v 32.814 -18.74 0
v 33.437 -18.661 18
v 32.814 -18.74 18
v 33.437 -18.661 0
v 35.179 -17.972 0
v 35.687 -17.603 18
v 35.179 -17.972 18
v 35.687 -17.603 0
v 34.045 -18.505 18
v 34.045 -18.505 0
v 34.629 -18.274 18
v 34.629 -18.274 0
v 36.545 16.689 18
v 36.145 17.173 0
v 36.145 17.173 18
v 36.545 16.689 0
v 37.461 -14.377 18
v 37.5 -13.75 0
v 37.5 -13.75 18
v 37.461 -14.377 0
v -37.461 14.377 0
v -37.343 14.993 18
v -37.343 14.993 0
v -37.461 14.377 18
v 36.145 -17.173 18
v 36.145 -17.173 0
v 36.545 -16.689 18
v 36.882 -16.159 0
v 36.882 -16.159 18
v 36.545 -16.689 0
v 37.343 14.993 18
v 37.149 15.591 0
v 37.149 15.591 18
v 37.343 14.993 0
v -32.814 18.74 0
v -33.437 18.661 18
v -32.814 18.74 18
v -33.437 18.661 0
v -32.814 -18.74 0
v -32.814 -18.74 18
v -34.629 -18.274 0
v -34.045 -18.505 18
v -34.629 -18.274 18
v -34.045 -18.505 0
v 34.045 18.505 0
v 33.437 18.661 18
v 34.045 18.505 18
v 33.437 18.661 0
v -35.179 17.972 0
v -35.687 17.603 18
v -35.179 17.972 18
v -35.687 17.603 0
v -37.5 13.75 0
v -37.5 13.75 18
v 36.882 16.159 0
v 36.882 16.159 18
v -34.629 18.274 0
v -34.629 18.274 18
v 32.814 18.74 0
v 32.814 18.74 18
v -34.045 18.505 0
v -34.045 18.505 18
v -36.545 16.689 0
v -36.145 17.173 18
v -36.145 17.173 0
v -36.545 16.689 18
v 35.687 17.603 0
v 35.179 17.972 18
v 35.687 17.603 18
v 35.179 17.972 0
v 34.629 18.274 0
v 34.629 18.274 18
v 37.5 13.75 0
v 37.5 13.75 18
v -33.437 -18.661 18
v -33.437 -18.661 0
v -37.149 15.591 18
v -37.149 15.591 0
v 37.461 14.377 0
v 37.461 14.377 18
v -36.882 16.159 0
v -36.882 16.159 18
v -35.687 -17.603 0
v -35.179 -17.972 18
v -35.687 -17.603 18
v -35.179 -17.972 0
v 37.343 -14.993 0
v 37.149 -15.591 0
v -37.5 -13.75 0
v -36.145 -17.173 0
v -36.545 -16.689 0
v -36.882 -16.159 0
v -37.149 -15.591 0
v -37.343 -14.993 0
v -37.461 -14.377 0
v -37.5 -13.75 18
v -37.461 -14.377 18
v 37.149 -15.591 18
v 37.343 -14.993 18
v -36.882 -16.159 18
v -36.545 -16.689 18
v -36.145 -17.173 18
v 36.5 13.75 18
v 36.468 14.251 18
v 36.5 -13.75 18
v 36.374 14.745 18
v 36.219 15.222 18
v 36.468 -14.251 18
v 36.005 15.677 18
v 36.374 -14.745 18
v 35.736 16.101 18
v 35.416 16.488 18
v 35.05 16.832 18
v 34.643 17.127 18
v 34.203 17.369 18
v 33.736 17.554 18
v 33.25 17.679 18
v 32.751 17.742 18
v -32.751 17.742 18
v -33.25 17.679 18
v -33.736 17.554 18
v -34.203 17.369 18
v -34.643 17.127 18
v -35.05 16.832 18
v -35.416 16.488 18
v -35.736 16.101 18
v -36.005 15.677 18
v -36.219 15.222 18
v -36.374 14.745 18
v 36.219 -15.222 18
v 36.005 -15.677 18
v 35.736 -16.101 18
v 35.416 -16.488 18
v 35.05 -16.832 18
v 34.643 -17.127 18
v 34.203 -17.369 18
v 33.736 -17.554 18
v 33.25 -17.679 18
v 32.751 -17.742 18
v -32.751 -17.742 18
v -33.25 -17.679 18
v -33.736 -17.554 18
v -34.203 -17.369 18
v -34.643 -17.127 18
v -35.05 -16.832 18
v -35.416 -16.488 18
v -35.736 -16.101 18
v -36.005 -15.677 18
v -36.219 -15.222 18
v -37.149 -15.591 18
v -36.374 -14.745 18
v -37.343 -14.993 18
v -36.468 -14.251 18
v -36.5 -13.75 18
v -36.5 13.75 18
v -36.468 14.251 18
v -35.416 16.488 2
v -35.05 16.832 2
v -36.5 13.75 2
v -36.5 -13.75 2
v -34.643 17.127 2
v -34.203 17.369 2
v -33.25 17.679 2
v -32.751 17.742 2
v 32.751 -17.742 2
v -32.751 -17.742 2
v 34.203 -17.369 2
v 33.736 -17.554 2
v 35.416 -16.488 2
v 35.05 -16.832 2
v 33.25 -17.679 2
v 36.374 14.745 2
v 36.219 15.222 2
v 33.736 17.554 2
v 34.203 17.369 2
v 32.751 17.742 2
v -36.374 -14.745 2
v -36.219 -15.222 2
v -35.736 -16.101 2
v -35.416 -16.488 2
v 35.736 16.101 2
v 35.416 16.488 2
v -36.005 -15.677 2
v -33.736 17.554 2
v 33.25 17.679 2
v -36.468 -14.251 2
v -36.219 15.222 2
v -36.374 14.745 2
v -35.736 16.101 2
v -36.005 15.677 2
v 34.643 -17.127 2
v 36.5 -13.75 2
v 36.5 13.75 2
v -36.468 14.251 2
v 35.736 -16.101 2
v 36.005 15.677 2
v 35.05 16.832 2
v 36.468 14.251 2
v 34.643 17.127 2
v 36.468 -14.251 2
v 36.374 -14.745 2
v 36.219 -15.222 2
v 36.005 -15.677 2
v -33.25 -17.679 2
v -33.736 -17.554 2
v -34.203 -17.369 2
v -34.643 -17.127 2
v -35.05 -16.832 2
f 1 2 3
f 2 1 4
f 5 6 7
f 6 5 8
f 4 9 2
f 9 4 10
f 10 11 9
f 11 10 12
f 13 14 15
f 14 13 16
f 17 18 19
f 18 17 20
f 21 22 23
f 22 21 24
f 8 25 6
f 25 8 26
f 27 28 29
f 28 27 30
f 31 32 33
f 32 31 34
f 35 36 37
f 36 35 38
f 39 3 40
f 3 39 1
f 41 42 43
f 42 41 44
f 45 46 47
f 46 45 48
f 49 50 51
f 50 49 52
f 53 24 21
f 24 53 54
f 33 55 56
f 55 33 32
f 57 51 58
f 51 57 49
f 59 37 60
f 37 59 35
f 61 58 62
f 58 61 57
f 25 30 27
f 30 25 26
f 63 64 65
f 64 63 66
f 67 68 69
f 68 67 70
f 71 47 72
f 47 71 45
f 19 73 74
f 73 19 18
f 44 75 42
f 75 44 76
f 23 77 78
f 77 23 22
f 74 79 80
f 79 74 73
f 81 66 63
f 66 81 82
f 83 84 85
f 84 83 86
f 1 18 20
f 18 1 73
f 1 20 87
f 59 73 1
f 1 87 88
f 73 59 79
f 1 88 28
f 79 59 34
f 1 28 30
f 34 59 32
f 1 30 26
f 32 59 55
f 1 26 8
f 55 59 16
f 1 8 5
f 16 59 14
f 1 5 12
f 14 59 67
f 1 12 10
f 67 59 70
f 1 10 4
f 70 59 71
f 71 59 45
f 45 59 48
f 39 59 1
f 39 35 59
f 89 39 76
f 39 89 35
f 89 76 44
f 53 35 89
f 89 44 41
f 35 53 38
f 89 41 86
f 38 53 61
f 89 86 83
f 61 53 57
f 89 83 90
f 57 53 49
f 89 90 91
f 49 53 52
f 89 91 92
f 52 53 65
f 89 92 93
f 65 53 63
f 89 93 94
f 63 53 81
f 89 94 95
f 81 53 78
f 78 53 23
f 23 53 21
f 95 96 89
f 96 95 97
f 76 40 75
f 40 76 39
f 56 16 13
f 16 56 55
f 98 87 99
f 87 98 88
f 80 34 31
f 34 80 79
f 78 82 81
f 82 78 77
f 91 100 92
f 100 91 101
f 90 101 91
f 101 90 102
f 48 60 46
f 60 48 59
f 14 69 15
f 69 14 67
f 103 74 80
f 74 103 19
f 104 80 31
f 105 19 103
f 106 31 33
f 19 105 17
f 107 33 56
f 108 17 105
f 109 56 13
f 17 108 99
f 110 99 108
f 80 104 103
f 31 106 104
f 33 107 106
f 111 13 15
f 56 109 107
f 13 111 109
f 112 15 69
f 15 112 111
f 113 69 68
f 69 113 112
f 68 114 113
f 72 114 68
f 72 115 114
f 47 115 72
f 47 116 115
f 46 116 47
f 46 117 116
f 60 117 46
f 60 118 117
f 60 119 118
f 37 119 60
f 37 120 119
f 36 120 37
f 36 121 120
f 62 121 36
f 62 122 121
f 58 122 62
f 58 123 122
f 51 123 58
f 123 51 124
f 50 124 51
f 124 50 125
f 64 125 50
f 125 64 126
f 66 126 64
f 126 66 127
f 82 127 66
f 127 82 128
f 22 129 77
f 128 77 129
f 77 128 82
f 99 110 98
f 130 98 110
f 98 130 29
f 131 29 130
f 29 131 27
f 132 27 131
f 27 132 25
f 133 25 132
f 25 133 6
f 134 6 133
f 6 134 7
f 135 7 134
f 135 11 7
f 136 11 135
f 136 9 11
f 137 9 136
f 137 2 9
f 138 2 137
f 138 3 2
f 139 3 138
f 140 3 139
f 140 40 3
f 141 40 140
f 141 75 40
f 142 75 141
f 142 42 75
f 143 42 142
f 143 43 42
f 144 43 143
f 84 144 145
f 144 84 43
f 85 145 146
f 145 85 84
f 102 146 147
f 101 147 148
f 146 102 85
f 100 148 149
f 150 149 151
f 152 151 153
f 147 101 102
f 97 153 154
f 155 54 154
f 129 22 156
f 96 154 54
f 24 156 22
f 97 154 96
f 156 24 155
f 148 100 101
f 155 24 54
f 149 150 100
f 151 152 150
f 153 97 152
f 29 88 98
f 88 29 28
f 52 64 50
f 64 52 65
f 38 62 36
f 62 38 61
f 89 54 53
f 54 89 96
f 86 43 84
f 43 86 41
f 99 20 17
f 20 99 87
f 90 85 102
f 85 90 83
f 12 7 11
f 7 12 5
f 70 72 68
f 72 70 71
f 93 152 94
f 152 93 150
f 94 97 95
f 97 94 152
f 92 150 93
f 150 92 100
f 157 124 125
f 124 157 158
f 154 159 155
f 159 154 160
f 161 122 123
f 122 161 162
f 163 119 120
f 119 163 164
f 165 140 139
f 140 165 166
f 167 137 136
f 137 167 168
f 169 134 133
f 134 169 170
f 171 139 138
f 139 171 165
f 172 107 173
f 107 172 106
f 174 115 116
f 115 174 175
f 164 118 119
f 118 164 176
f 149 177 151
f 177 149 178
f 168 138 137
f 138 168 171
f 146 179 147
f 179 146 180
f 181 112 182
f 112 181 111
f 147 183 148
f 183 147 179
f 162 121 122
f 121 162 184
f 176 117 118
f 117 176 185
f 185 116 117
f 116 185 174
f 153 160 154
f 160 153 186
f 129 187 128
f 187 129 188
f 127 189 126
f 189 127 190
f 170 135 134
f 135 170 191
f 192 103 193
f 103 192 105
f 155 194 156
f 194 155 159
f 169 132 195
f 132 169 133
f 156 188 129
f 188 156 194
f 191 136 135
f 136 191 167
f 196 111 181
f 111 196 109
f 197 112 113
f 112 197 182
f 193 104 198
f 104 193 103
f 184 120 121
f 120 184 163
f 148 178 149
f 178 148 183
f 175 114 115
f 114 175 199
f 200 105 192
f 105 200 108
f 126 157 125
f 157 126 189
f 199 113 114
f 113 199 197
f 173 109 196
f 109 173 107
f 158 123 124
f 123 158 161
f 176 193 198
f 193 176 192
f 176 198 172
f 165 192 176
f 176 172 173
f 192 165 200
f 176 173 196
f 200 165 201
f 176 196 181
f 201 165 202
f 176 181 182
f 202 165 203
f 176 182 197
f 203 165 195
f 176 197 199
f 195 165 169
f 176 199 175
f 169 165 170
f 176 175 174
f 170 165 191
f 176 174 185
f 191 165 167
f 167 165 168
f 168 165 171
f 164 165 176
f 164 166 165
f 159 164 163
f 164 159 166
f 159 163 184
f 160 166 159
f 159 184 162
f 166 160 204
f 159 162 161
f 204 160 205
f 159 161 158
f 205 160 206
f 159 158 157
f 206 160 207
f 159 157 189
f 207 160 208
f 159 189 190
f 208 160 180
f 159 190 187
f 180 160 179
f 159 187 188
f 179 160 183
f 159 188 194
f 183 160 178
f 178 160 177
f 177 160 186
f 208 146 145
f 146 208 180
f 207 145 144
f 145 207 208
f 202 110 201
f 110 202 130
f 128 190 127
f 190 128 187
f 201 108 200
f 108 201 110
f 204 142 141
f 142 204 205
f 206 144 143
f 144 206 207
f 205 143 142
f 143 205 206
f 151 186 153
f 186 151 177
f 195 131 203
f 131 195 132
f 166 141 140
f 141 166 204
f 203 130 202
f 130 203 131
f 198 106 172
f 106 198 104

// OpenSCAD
$fn = 50;


difference() {
	union() {
		hull() {
			translate(v = [-32.5000000000, 13.7500000000, 0]) {
				cylinder(h = 18, r = 5);
			}
			translate(v = [32.5000000000, 13.7500000000, 0]) {
				cylinder(h = 18, r = 5);
			}
			translate(v = [-32.5000000000, -13.7500000000, 0]) {
				cylinder(h = 18, r = 5);
			}
			translate(v = [32.5000000000, -13.7500000000, 0]) {
				cylinder(h = 18, r = 5);
			}
		}
	}
	union() {
		translate(v = [0, 0, 2]) {
			#hull() {
				translate(v = [-32.5000000000, 13.7500000000, 0]) {
					cylinder(h = 16, r = 4);
				}
				translate(v = [32.5000000000, 13.7500000000, 0]) {
					cylinder(h = 16, r = 4);
				}
				translate(v = [-32.5000000000, -13.7500000000, 0]) {
					cylinder(h = 16, r = 4);
				}
				translate(v = [32.5000000000, -13.7500000000, 0]) {
					cylinder(h = 16, r = 4);
				}
			}
		}
	}
}
